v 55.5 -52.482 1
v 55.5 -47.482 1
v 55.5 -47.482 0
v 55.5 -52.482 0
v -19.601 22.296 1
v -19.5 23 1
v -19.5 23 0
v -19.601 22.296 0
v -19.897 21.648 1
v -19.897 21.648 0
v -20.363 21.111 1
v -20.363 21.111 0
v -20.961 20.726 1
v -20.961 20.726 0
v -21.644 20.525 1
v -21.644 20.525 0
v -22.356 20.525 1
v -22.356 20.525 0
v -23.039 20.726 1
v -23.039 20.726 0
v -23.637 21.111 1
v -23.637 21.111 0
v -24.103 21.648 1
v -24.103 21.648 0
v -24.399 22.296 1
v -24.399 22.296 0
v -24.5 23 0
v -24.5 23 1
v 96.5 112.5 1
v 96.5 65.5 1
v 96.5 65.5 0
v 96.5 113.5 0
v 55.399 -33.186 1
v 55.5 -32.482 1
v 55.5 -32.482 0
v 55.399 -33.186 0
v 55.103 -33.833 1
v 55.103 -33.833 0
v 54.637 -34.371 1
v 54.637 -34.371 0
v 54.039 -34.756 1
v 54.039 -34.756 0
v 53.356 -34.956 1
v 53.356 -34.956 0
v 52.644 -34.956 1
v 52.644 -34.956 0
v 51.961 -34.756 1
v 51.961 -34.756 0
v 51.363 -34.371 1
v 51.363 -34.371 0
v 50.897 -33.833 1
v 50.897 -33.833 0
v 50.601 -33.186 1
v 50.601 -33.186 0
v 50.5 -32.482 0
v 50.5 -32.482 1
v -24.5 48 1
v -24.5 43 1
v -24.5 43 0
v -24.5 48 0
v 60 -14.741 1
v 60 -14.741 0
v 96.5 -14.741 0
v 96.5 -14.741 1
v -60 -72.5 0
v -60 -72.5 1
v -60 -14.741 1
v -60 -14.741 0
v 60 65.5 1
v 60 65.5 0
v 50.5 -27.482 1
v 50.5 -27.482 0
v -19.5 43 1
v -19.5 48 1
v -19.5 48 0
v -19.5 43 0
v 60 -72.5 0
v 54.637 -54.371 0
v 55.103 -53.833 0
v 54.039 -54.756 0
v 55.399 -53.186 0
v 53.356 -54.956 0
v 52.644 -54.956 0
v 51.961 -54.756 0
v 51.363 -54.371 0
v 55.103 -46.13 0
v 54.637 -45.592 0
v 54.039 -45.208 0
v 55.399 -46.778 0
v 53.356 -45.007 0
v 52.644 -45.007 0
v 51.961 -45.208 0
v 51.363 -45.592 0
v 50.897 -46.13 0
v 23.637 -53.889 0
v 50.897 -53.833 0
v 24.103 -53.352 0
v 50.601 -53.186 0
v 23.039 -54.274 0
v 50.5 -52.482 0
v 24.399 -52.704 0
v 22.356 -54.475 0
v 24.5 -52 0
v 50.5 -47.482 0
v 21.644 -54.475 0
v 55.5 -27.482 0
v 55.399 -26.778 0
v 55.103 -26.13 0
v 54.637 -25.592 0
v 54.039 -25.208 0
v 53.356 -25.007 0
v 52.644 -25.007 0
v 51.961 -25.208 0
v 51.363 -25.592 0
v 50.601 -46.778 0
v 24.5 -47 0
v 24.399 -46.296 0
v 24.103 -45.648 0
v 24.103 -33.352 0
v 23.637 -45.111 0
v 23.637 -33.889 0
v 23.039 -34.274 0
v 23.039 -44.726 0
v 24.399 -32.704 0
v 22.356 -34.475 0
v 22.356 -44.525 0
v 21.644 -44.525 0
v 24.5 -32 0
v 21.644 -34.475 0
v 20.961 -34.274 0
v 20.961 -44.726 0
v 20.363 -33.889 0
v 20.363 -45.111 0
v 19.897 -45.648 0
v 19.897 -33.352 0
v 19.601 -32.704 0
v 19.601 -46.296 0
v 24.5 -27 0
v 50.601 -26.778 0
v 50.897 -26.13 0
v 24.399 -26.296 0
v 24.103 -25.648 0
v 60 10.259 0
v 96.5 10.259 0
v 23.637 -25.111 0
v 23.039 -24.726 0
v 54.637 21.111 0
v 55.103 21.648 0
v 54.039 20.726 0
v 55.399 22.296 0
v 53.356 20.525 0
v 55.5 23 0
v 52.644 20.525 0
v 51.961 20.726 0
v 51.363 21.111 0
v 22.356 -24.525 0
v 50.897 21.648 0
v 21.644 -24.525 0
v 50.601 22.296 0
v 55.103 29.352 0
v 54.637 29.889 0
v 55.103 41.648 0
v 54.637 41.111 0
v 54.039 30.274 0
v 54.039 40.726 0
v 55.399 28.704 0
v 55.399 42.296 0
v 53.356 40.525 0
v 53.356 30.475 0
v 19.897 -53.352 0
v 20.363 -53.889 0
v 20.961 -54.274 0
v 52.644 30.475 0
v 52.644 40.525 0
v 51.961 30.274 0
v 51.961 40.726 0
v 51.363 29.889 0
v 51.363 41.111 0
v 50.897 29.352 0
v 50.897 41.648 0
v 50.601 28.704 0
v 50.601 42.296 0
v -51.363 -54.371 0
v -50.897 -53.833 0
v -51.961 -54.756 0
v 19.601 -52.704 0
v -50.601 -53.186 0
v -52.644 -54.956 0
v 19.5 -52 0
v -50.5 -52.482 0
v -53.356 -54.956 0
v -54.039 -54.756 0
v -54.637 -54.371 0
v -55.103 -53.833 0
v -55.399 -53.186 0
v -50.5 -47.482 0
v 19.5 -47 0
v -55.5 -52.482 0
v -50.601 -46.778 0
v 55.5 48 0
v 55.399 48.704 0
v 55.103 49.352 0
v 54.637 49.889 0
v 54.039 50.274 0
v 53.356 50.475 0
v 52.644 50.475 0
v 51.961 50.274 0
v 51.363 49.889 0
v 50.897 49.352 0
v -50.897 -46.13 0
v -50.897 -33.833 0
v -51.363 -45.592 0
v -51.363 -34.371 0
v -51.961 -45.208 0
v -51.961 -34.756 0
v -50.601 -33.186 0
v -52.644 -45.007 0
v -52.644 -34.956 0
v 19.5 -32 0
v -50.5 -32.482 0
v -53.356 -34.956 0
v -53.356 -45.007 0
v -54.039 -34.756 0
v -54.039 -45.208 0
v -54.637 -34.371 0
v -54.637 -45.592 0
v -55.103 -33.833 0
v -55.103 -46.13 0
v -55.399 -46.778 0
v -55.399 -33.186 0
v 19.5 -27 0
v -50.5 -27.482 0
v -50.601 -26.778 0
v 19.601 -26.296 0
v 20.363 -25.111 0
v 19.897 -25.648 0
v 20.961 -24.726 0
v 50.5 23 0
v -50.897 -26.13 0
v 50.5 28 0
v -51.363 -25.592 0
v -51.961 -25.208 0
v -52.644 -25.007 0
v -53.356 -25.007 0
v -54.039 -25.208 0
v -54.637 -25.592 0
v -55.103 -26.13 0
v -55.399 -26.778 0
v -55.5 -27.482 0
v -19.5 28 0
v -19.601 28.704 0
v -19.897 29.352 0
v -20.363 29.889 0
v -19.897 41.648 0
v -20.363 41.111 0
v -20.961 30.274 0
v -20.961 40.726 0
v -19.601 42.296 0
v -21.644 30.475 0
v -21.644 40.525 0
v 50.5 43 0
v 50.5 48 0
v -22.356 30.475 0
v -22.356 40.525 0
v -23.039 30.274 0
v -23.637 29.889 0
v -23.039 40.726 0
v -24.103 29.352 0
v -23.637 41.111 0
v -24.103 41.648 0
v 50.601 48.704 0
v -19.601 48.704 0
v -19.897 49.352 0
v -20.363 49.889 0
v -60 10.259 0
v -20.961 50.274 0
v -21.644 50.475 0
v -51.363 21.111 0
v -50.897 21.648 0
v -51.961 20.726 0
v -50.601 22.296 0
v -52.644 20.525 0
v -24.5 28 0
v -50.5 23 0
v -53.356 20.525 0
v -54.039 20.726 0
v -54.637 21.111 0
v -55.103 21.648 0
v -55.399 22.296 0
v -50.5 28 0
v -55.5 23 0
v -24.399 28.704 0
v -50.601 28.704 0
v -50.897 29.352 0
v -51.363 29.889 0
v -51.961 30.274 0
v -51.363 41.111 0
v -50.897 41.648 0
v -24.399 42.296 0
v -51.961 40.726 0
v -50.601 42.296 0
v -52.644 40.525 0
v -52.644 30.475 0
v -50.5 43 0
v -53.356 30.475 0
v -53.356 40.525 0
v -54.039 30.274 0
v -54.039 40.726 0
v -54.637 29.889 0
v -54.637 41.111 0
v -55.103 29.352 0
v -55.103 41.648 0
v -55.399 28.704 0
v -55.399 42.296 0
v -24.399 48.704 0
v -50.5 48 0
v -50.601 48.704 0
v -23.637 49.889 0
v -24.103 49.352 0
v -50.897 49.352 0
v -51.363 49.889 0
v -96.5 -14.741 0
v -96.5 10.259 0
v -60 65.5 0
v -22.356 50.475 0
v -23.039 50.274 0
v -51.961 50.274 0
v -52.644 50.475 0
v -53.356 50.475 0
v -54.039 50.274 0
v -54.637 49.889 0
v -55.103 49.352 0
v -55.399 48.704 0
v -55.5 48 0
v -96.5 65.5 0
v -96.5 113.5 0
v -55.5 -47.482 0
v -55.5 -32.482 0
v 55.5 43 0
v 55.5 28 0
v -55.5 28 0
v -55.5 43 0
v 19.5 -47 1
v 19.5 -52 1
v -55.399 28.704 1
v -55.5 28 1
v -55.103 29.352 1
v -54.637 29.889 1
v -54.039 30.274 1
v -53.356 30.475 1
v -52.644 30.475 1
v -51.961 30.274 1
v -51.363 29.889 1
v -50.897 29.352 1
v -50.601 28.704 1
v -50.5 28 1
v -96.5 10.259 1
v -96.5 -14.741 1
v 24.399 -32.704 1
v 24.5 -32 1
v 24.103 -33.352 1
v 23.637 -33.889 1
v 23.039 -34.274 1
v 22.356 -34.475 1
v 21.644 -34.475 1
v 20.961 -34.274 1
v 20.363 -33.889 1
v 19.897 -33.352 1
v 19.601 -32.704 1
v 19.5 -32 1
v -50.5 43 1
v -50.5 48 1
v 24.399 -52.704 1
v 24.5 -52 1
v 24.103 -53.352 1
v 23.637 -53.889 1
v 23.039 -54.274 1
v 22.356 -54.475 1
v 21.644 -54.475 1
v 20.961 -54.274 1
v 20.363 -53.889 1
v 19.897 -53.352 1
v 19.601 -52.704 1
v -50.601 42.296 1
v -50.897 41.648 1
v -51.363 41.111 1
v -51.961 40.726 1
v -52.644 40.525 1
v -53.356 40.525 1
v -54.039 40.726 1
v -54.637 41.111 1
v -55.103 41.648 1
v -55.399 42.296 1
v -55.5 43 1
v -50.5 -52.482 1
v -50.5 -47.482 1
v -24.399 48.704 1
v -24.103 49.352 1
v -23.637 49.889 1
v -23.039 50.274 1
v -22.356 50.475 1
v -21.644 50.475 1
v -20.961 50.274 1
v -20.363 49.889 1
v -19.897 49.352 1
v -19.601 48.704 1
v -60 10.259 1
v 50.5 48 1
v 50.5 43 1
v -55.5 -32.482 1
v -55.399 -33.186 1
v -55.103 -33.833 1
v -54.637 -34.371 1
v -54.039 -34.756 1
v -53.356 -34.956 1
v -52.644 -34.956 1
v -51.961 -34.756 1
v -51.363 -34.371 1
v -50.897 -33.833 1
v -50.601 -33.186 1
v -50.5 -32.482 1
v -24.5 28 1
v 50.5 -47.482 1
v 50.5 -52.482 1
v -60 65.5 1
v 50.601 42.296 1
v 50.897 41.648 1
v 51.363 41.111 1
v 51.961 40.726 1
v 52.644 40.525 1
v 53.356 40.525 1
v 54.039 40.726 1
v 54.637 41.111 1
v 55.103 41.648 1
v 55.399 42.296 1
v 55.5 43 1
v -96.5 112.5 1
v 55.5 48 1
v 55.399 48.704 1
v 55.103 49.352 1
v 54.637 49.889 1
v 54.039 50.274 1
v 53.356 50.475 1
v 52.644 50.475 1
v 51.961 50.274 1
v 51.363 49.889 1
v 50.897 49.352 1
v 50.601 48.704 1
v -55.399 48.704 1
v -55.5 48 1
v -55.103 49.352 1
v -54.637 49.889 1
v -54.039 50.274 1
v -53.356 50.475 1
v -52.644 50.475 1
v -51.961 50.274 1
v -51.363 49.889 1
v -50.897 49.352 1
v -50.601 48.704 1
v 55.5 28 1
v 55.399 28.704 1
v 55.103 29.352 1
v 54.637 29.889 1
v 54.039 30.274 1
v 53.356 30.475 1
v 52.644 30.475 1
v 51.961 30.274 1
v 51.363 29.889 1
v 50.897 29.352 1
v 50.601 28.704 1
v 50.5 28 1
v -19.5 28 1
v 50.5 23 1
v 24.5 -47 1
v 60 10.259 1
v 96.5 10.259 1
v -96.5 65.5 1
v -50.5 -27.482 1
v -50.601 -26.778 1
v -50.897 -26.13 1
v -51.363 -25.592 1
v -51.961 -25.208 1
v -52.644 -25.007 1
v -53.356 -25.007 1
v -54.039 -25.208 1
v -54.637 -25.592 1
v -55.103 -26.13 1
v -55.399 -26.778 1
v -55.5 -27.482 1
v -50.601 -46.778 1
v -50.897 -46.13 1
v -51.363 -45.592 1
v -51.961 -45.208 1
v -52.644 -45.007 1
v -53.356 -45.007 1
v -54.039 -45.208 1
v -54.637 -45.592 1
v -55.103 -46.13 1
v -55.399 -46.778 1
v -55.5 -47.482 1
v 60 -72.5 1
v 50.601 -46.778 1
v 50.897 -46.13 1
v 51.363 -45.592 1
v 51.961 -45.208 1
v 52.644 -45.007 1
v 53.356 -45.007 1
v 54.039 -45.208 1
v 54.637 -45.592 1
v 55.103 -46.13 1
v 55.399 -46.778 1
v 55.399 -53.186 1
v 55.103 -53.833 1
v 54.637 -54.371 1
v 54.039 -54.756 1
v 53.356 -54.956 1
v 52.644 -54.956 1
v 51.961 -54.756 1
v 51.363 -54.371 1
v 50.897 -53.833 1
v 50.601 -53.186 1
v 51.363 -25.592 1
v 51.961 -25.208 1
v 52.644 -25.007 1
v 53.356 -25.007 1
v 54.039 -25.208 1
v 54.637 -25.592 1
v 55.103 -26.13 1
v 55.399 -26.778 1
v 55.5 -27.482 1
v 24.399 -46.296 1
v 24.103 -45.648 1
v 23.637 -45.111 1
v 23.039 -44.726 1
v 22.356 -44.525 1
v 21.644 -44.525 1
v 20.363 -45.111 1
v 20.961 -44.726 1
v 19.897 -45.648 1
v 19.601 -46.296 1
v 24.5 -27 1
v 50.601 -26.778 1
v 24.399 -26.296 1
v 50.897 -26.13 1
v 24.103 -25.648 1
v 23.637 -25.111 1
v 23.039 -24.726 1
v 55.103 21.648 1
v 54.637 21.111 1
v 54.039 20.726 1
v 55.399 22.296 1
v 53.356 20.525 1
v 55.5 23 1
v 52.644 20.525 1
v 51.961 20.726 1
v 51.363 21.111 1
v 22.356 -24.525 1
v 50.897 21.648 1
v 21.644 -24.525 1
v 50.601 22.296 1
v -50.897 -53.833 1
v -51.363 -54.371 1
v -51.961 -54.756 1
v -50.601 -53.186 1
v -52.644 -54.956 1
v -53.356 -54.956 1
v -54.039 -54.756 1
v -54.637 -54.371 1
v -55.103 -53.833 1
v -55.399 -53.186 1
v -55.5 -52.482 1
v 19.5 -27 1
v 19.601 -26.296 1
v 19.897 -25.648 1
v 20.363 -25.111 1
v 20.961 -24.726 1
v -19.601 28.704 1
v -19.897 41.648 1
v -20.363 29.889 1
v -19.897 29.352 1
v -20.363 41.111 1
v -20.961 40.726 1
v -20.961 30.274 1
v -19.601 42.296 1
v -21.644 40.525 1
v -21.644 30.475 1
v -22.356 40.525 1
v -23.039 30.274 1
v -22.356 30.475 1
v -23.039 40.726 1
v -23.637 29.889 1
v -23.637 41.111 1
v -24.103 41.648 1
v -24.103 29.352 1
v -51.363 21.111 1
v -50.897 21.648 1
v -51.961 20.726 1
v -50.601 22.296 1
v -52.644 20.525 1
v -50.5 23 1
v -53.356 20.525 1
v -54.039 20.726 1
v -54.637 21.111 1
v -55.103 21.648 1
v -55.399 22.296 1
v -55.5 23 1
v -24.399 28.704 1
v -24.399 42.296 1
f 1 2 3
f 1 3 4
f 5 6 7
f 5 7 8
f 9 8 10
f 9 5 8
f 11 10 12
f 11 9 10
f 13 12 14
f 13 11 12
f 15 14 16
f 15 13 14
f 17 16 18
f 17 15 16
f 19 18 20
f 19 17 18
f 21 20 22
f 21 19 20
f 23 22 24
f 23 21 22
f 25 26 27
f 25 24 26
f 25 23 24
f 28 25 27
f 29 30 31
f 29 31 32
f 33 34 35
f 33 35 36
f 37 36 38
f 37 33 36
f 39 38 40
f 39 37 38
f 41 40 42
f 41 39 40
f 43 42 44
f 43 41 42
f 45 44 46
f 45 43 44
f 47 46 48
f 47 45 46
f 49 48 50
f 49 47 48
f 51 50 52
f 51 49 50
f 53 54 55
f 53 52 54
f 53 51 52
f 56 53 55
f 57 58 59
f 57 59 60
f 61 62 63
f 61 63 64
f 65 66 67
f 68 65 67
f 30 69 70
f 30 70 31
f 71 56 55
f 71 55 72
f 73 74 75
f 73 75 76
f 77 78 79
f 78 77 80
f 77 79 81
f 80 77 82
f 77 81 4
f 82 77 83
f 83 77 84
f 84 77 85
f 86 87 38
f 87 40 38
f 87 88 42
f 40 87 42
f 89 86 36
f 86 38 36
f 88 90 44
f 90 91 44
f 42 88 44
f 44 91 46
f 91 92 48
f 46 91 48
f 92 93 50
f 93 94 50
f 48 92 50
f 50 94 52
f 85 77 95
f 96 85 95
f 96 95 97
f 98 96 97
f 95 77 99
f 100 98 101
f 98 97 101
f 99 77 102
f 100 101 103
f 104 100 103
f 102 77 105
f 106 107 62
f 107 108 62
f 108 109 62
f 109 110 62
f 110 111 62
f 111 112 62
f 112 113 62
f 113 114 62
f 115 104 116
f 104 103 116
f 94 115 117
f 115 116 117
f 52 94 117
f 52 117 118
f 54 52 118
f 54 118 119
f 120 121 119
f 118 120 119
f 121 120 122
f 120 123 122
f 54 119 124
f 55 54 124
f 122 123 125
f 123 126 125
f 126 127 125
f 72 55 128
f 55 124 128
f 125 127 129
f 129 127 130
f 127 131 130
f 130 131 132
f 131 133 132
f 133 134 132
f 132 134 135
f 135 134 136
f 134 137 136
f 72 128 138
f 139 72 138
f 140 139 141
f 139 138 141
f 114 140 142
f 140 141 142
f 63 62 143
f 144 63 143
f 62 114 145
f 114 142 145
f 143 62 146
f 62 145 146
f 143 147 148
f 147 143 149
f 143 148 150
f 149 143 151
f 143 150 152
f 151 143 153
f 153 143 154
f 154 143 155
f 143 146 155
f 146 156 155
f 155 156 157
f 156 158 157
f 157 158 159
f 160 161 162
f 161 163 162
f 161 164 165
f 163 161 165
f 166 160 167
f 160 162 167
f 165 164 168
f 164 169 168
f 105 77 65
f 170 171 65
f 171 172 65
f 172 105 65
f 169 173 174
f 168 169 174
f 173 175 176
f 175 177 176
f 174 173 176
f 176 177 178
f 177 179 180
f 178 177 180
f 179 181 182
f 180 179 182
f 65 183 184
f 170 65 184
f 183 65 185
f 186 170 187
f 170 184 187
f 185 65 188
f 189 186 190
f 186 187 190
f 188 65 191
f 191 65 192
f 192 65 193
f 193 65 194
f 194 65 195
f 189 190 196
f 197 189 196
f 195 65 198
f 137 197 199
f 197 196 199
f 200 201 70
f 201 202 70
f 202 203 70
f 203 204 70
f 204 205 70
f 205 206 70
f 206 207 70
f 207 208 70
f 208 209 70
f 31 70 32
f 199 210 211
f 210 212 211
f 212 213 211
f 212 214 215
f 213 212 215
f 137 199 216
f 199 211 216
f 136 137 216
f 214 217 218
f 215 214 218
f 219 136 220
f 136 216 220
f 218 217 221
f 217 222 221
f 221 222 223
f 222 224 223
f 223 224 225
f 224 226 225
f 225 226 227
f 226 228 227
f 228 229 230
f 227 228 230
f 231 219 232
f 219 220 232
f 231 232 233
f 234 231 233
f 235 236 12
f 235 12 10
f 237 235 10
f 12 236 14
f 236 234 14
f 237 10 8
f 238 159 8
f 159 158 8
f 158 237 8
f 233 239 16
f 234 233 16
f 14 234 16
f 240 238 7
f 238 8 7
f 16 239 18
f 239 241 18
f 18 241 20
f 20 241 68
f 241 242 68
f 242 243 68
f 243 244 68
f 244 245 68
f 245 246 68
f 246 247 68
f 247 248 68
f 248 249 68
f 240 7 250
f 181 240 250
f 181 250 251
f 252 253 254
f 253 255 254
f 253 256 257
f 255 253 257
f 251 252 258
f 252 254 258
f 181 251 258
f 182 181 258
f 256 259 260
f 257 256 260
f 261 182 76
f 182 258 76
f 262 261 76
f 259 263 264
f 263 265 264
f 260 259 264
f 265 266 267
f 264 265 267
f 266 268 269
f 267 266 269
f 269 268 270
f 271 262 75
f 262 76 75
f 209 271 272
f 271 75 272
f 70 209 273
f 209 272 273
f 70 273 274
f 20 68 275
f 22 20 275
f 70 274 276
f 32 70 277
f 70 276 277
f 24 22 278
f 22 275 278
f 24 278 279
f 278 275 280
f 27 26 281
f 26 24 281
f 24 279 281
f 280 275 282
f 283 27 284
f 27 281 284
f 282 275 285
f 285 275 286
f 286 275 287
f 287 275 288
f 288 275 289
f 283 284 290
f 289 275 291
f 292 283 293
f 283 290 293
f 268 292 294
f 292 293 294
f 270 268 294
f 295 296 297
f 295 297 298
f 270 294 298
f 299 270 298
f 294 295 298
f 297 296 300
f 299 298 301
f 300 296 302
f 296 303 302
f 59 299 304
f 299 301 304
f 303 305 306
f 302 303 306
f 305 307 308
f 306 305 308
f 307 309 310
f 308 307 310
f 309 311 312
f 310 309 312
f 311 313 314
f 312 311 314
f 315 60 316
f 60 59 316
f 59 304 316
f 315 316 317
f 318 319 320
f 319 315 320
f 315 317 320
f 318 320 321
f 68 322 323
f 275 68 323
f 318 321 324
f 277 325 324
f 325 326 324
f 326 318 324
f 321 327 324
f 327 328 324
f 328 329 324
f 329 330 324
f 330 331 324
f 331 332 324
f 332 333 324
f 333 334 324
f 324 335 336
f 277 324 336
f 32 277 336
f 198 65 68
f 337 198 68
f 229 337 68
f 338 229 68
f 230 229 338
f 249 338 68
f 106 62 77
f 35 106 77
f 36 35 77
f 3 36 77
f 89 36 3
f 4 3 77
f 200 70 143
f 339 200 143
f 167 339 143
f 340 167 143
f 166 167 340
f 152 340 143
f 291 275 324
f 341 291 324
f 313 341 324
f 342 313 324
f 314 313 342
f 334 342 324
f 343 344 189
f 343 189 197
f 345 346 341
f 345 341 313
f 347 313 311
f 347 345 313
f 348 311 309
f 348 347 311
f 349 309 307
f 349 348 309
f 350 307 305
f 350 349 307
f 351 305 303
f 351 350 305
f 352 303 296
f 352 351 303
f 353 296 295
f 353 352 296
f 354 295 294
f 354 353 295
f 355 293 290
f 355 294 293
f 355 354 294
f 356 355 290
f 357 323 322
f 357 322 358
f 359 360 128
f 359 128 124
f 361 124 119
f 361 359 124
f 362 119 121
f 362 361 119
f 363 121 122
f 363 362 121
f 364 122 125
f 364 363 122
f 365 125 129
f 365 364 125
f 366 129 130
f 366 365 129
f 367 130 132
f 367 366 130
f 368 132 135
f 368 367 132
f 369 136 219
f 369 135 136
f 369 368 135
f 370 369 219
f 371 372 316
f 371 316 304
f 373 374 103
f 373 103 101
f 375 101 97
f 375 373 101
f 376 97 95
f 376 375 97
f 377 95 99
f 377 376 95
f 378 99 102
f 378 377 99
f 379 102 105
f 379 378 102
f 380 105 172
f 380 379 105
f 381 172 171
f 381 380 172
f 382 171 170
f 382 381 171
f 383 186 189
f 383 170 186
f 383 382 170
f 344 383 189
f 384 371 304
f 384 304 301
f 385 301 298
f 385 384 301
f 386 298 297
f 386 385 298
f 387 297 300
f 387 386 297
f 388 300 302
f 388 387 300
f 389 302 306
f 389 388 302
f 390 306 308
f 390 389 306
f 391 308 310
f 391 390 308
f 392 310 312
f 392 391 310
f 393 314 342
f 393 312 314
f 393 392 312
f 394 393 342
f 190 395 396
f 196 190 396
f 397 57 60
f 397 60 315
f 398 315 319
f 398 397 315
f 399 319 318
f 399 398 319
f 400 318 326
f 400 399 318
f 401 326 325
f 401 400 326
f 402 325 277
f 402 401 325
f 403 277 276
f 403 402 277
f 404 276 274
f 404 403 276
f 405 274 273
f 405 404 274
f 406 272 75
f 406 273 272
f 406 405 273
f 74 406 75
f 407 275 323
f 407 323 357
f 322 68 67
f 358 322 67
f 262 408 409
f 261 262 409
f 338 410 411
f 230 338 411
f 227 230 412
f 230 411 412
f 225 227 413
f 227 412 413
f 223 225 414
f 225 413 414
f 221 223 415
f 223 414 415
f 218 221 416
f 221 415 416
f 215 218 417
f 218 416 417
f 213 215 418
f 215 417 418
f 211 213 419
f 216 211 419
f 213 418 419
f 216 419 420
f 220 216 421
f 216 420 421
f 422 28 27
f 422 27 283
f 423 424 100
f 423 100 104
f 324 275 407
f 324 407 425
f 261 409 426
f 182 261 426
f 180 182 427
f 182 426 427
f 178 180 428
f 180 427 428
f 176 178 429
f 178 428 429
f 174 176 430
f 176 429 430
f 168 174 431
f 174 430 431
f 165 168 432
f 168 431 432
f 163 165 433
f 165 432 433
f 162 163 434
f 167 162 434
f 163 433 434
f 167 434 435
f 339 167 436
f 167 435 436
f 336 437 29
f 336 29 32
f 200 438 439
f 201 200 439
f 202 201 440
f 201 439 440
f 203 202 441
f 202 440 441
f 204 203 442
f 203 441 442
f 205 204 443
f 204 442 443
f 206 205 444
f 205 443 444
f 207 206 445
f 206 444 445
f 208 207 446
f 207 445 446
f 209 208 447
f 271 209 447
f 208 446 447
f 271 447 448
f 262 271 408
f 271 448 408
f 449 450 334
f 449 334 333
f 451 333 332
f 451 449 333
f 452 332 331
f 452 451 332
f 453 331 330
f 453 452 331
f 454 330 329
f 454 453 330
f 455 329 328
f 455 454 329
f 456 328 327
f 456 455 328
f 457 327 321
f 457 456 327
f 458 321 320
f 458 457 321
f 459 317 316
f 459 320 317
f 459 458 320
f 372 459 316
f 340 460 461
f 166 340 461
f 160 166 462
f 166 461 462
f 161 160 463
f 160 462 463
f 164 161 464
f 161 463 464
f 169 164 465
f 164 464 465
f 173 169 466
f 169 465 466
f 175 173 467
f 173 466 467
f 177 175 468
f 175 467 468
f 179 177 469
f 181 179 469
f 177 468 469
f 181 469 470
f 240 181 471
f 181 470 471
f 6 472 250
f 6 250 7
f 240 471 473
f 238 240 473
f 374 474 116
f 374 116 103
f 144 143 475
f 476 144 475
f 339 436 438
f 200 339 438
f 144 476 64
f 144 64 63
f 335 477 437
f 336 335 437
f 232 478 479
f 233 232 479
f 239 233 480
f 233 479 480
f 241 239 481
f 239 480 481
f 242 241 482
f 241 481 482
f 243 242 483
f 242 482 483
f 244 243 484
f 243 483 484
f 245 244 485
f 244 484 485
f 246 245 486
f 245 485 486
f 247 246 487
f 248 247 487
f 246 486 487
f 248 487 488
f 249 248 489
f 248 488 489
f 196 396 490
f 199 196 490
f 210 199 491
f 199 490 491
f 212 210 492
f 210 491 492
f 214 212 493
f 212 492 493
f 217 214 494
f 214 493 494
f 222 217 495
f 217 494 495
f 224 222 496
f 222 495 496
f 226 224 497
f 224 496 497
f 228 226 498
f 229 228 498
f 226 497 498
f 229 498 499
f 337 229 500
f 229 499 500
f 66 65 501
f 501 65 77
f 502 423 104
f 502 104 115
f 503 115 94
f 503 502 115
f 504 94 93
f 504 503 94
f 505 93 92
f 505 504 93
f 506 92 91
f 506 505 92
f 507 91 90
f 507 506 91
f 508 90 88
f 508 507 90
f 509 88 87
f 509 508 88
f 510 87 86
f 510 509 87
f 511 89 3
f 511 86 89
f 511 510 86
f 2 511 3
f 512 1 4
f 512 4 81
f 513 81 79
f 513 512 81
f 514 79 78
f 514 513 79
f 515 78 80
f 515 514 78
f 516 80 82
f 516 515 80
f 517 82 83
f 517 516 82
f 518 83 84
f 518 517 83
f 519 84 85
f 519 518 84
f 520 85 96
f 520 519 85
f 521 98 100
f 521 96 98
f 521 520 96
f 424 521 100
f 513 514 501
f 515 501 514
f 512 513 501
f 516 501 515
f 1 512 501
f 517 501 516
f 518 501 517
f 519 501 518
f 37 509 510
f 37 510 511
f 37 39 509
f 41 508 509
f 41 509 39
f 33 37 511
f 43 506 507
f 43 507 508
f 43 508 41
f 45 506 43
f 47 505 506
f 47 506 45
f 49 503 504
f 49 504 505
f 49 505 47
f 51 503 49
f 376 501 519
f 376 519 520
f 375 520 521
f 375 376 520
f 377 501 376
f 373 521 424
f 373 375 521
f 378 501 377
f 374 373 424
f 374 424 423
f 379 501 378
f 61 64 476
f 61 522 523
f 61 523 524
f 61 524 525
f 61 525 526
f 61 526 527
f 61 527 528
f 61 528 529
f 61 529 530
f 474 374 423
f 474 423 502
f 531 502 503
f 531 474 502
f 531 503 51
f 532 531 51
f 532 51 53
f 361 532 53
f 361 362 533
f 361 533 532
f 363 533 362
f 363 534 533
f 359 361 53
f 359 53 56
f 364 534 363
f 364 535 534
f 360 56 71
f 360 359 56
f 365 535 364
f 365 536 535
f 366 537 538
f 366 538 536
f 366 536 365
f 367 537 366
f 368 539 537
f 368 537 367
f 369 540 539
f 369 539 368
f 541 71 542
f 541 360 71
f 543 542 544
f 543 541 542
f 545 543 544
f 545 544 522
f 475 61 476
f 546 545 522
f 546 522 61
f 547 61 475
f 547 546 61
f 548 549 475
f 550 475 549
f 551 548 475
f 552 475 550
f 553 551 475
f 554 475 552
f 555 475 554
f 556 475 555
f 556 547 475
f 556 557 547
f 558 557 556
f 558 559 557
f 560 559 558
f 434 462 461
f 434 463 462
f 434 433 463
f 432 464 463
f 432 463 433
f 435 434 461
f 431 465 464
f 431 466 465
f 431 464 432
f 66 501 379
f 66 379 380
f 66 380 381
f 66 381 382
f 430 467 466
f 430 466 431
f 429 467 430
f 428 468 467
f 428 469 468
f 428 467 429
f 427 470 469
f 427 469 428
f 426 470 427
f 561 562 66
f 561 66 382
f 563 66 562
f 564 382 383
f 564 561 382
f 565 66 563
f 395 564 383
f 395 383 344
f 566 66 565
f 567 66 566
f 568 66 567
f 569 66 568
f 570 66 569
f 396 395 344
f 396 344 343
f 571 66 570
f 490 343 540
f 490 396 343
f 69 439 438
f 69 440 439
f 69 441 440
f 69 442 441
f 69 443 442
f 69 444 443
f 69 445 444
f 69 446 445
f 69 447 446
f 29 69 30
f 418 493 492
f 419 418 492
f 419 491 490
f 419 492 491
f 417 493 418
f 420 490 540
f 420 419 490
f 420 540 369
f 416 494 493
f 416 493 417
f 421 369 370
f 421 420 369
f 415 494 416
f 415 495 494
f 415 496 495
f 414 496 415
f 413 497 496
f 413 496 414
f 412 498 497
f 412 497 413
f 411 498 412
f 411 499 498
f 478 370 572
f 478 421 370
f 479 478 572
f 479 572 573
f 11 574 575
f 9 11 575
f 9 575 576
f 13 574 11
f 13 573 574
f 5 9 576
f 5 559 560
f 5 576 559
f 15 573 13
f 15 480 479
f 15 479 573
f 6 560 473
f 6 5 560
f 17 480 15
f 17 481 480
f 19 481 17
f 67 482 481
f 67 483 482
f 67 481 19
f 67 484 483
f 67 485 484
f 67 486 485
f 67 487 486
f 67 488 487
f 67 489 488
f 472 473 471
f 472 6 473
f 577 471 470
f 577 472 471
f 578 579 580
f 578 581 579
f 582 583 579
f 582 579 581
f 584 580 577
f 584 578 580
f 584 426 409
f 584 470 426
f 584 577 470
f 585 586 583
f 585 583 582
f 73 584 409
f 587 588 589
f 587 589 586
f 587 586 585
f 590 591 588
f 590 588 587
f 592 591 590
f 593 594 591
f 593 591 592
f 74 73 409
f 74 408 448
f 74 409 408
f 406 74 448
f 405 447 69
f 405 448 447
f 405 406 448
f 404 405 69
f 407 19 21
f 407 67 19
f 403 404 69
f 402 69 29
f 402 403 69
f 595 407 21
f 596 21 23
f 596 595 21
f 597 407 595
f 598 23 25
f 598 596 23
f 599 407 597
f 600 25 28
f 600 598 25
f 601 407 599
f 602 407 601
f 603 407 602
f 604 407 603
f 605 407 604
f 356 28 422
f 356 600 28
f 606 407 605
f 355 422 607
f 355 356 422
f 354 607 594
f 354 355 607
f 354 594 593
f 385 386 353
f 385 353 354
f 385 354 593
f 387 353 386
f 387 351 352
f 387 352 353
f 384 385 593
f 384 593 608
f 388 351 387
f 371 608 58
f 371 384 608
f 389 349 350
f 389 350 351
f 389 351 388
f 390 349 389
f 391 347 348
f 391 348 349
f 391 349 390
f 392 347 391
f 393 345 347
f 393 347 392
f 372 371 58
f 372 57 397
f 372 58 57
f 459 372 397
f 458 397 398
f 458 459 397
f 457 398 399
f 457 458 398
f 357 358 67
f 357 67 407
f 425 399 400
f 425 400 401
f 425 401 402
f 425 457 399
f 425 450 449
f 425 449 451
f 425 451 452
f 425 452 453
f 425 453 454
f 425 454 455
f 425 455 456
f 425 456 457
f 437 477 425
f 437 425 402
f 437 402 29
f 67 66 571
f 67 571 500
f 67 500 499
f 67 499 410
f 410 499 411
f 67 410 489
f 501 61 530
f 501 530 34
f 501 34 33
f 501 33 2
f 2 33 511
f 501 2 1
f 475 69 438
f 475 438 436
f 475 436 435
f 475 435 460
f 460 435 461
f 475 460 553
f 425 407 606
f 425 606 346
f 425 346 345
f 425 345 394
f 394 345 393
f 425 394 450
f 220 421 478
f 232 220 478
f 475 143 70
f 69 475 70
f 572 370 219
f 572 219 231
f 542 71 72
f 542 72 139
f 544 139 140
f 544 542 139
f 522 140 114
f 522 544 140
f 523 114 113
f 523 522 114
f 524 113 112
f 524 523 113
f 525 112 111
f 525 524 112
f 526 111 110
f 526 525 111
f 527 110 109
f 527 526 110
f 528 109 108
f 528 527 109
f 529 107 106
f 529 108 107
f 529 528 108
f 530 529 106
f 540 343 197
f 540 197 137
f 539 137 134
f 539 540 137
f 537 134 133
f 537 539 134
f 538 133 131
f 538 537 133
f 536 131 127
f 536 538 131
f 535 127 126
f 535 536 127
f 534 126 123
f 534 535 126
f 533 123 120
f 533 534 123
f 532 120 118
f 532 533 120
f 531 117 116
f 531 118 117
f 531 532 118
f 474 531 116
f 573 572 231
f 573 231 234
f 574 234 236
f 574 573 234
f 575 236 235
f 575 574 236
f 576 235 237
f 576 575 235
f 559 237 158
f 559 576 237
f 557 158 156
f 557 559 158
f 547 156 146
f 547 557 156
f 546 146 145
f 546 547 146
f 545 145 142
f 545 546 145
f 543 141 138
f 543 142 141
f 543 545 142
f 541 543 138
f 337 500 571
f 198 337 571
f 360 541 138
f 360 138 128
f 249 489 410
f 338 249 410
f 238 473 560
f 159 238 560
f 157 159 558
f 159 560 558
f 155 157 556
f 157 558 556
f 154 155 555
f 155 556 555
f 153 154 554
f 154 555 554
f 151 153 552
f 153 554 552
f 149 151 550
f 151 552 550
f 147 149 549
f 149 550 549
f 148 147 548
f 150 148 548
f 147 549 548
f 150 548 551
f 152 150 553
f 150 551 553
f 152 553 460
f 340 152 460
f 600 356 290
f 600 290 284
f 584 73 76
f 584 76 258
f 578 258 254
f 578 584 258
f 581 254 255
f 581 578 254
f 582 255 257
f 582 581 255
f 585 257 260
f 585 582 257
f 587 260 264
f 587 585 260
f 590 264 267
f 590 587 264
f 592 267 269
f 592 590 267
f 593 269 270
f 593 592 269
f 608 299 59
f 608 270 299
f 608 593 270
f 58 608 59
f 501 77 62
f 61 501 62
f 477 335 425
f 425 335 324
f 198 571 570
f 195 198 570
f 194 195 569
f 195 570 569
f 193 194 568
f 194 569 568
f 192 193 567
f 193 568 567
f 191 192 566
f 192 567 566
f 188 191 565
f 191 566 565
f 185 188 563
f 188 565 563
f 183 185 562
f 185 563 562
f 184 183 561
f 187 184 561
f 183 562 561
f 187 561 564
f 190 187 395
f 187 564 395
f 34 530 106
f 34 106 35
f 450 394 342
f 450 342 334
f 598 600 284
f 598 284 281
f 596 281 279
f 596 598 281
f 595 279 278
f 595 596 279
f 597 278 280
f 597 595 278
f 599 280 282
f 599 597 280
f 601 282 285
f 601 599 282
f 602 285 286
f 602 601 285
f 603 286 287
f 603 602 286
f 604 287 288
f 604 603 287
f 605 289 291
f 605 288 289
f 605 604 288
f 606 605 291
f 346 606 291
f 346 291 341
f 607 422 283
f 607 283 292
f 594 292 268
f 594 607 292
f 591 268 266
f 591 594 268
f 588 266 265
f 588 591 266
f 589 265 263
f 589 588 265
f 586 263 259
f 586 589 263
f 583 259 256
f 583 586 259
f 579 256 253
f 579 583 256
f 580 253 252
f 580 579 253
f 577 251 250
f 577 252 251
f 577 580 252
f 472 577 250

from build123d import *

# Parameters (mm, degrees)
SKETCH1_W           = 193
SKETCH1_H           = 145
SKETCH1_W_2         = 35
SKETCH1_H_2         = 60
BOSS_EXTRUDE1_DEPTH = 1
SKETCH2_R           = 2.5
CUT_EXTRUDE1_DEPTH  = 3
SKETCH3_W           = 1.5
SKETCH3_H           = 60.155824732
SKETCH3_H_2         = 60
CUT_EXTRUDE2_DEPTH  = 3
SKETCH4_W           = 193
SKETCH4_H           = 42
BOSS_EXTRUDE2_DEPTH = 1
SKETCH5_W           = 1
SKETCH5_H           = 25
BOSS_EXTRUDE3_DEPTH = 194
CHAMFER1_SIZE       = 2
SKETCH7_W           = 36.5
SKETCH7_H           = 3
CUT_EXTRUDE3_DEPTH  = 10
SKETCH8_R           = 2.5
CUT_EXTRUDE4_DEPTH  = 10
SKETCH11_W          = 1
SKETCH11_H          = 25
CUT_EXTRUDE5_DEPTH  = 1
CUT_EXTRUDE6_DEPTH  = 10


with BuildPart() as part:
    # Sketch1 → Boss-Extrude1 (new body)
    with BuildSketch(Plane.XY):
        Rectangle(SKETCH1_W, SKETCH1_H)
        with Locations((-77.5, 35.5)):
            Rectangle(SKETCH1_W_2, SKETCH1_H_2, mode=Mode.SUBTRACT)
        with Locations((77.5, 35.5)):
            Rectangle(SKETCH1_W_2, SKETCH1_H_2, mode=Mode.SUBTRACT)
        with Locations((77.5, -39.5)):
            Rectangle(SKETCH1_W_2, SKETCH1_H_2, mode=Mode.SUBTRACT)
        with Locations((-77.5, -39.5)):
            Rectangle(SKETCH1_W_2, SKETCH1_H_2, mode=Mode.SUBTRACT)
    extrude(amount=BOSS_EXTRUDE1_DEPTH)

    # Sketch2 → Cut-Extrude1 (cut)
    with BuildSketch(Plane.XY.offset(1)):
        with Locations((-53, 45.5)):
            Circle(SKETCH2_R)
        with Locations((-53, 25.5)):
            Circle(SKETCH2_R)
        with Locations((-53, -49.5)):
            Circle(SKETCH2_R)
        with Locations((-53, -29.5)):
            Circle(SKETCH2_R)
        with Locations((53, -29.5)):
            Circle(SKETCH2_R)
        with Locations((53, -49.5)):
            Circle(SKETCH2_R)
        with Locations((53, 25.5)):
            Circle(SKETCH2_R)
        with Locations((53, 45.5)):
            Circle(SKETCH2_R)
    extrude(amount=-CUT_EXTRUDE1_DEPTH, mode=Mode.SUBTRACT)

    # Sketch3 → Cut-Extrude2 (cut)
    with BuildSketch(Plane.XY.offset(1)):
        with Locations((-95.75, 35.422087634)):
            Rectangle(SKETCH3_W, SKETCH3_H)
        with Locations((-95.75, -39.5)):
            Rectangle(SKETCH3_W, SKETCH3_H_2)
        with Locations((95.75, -39.5)):
            Rectangle(SKETCH3_W, SKETCH3_H_2)
        with Locations((95.75, 35.5)):
            Rectangle(SKETCH3_W, SKETCH3_H_2)
    extrude(amount=-CUT_EXTRUDE2_DEPTH, mode=Mode.SUBTRACT)

    # Sketch4 → Boss-Extrude2 (add)
    with BuildSketch(Plane.XY.offset(1)):
        with Locations((0, 93.5)):
            Rectangle(SKETCH4_W, SKETCH4_H)
    extrude(amount=-BOSS_EXTRUDE2_DEPTH)

    # Sketch5 → Boss-Extrude3 (add)
    with BuildSketch(Plane.ZY.offset(96.5)):
        with Locations((0.5, -2.240916736)):
            Rectangle(SKETCH5_W, SKETCH5_H)
    extrude(amount=-BOSS_EXTRUDE3_DEPTH)

    # Chamfer1
    # the kernel refuses this chamfer: 2 mm, written as the material it takes off along each edge
    with BuildSketch(Plane(origin=(101.643365976, 114.5, 1), x_dir=(0, -0.9996219169112968, 0.027495876610586306), z_dir=(-1, 0, 0))) as chamfer1_piece_1:
        Polygon((CHAMFER1_SIZE * 0.999621916911, -CHAMFER1_SIZE * 0.0274958766106), (-CHAMFER1_SIZE * 0.0274958766106, -CHAMFER1_SIZE * 0.999621916911), (0, 0), align=None)
    extrude(amount=203.286731952, mode=Mode.SUBTRACT)

    # Sketch7 → Cut-Extrude3 (cut)
    with BuildSketch(Plane.XY.offset(1)):
        with Locations((-78.25, -71)):
            Rectangle(SKETCH7_W, SKETCH7_H)
        with Locations((78.25, -71)):
            Rectangle(SKETCH7_W, SKETCH7_H)
    extrude(amount=-CUT_EXTRUDE3_DEPTH, mode=Mode.SUBTRACT)

    # Sketch8 → Cut-Extrude4 (cut)
    with BuildSketch(Plane.XY.offset(1)):
        with Locations((-22, 45.5)):
            Circle(SKETCH8_R)
        with Locations((-22, 25.5)):
            Circle(SKETCH8_R)
        with Locations((22, -29.5)):
            Circle(SKETCH8_R)
        with Locations((22, -49.5)):
            Circle(SKETCH8_R)
    extrude(amount=-CUT_EXTRUDE4_DEPTH, mode=Mode.SUBTRACT)

    # Sketch11 → Cut-Extrude5 (cut)
    with BuildSketch(Plane(origin=(97.5, 0, 0), x_dir=(0, 0, -1), z_dir=(1, 0, 0))):
        with Locations((-0.5, -2.240916736)):
            Rectangle(SKETCH11_W, SKETCH11_H)
    extrude(amount=-CUT_EXTRUDE5_DEPTH, mode=Mode.SUBTRACT)

    # Sketch12 → Cut-Extrude6 (cut)
    with BuildSketch(Plane.XY.offset(1)):
        with BuildLine():
            Line((-50.5, 48), (-50.5, 43))
            ThreePointArc((-50.5, 43), (-53, 40.5), (-55.5, 43))
            Line((-55.5, 43), (-55.5, 48))
            ThreePointArc((-55.5, 48), (-53, 50.5), (-50.5, 48))
        make_face()
        with BuildLine():
            Line((-19.5, 48), (-19.5, 43))
            ThreePointArc((-19.5, 43), (-22, 40.5), (-24.5, 43))
            Line((-24.5, 43), (-24.5, 48))
            ThreePointArc((-24.5, 48), (-22, 50.5), (-19.5, 48))
        make_face()
        with BuildLine():
            Line((-19.5, 28), (-19.5, 23))
            ThreePointArc((-19.5, 23), (-22, 20.5), (-24.5, 23))
            Line((-24.5, 23), (-24.5, 28))
            ThreePointArc((-24.5, 28), (-22, 30.5), (-19.5, 28))
        make_face()
        with BuildLine():
            Line((-50.5, 28), (-50.5, 23))
            ThreePointArc((-50.5, 23), (-53, 20.5), (-55.5, 23))
            Line((-55.5, 23), (-55.5, 28))
            ThreePointArc((-55.5, 28), (-53, 30.5), (-50.5, 28))
        make_face()
        with BuildLine():
            Line((50.5, 28), (50.5, 23))
            ThreePointArc((50.5, 23), (53, 20.5), (55.5, 23))
            Line((55.5, 23), (55.5, 28))
            ThreePointArc((55.5, 28), (53, 30.5), (50.5, 28))
        make_face()
        with BuildLine():
            Line((50.5, 48), (50.5, 43))
            ThreePointArc((50.5, 43), (53, 40.5), (55.5, 43))
            Line((55.5, 43), (55.5, 48))
            ThreePointArc((55.5, 48), (53, 50.5), (50.5, 48))
        make_face()
        with BuildLine():
            Line((50.5, -52.481833472), (50.5, -47.481833472))
            ThreePointArc((50.5, -47.481833472), (53, -44.981833472), (55.5, -47.481833472))
            Line((55.5, -47.481833472), (55.5, -52.481833472))
            ThreePointArc((55.5, -52.481833472), (53, -54.981833472), (50.5, -52.481833472))
        make_face()
        with BuildLine():
            Line((50.5, -32.481833472), (50.5, -27.481833472))
            ThreePointArc((50.5, -27.481833472), (53, -24.981833472), (55.5, -27.481833472))
            Line((55.5, -27.481833472), (55.5, -32.481833472))
            ThreePointArc((55.5, -32.481833472), (53, -34.981833472), (50.5, -32.481833472))
        make_face()
        with BuildLine():
            Line((-50.5, -32.481833472), (-50.5, -27.481833472))
            ThreePointArc((-50.5, -27.481833472), (-53, -24.981833472), (-55.5, -27.481833472))
            Line((-55.5, -27.481833472), (-55.5, -32.481833472))
            ThreePointArc((-55.5, -32.481833472), (-53, -34.981833472), (-50.5, -32.481833472))
        make_face()
        with BuildLine():
            Line((-50.5, -52.481833472), (-50.5, -47.481833472))
            ThreePointArc((-50.5, -47.481833472), (-53, -44.981833472), (-55.5, -47.481833472))
            Line((-55.5, -47.481833472), (-55.5, -52.481833472))
            ThreePointArc((-55.5, -52.481833472), (-53, -54.981833472), (-50.5, -52.481833472))
        make_face()
        with BuildLine():
            Line((24.5, -27), (24.5, -32))
            ThreePointArc((24.5, -32), (22, -34.5), (19.5, -32))
            Line((19.5, -32), (19.5, -27))
            ThreePointArc((19.5, -27), (22, -24.5), (24.5, -27))
        make_face()
        with BuildLine():
            Line((24.5, -47), (24.5, -52))
            ThreePointArc((24.5, -52), (22, -54.5), (19.5, -52))
            Line((19.5, -52), (19.5, -47))
            ThreePointArc((19.5, -47), (22, -44.5), (24.5, -47))
        make_face()
    extrude(amount=-CUT_EXTRUDE6_DEPTH, mode=Mode.SUBTRACT)


solid = part.part
